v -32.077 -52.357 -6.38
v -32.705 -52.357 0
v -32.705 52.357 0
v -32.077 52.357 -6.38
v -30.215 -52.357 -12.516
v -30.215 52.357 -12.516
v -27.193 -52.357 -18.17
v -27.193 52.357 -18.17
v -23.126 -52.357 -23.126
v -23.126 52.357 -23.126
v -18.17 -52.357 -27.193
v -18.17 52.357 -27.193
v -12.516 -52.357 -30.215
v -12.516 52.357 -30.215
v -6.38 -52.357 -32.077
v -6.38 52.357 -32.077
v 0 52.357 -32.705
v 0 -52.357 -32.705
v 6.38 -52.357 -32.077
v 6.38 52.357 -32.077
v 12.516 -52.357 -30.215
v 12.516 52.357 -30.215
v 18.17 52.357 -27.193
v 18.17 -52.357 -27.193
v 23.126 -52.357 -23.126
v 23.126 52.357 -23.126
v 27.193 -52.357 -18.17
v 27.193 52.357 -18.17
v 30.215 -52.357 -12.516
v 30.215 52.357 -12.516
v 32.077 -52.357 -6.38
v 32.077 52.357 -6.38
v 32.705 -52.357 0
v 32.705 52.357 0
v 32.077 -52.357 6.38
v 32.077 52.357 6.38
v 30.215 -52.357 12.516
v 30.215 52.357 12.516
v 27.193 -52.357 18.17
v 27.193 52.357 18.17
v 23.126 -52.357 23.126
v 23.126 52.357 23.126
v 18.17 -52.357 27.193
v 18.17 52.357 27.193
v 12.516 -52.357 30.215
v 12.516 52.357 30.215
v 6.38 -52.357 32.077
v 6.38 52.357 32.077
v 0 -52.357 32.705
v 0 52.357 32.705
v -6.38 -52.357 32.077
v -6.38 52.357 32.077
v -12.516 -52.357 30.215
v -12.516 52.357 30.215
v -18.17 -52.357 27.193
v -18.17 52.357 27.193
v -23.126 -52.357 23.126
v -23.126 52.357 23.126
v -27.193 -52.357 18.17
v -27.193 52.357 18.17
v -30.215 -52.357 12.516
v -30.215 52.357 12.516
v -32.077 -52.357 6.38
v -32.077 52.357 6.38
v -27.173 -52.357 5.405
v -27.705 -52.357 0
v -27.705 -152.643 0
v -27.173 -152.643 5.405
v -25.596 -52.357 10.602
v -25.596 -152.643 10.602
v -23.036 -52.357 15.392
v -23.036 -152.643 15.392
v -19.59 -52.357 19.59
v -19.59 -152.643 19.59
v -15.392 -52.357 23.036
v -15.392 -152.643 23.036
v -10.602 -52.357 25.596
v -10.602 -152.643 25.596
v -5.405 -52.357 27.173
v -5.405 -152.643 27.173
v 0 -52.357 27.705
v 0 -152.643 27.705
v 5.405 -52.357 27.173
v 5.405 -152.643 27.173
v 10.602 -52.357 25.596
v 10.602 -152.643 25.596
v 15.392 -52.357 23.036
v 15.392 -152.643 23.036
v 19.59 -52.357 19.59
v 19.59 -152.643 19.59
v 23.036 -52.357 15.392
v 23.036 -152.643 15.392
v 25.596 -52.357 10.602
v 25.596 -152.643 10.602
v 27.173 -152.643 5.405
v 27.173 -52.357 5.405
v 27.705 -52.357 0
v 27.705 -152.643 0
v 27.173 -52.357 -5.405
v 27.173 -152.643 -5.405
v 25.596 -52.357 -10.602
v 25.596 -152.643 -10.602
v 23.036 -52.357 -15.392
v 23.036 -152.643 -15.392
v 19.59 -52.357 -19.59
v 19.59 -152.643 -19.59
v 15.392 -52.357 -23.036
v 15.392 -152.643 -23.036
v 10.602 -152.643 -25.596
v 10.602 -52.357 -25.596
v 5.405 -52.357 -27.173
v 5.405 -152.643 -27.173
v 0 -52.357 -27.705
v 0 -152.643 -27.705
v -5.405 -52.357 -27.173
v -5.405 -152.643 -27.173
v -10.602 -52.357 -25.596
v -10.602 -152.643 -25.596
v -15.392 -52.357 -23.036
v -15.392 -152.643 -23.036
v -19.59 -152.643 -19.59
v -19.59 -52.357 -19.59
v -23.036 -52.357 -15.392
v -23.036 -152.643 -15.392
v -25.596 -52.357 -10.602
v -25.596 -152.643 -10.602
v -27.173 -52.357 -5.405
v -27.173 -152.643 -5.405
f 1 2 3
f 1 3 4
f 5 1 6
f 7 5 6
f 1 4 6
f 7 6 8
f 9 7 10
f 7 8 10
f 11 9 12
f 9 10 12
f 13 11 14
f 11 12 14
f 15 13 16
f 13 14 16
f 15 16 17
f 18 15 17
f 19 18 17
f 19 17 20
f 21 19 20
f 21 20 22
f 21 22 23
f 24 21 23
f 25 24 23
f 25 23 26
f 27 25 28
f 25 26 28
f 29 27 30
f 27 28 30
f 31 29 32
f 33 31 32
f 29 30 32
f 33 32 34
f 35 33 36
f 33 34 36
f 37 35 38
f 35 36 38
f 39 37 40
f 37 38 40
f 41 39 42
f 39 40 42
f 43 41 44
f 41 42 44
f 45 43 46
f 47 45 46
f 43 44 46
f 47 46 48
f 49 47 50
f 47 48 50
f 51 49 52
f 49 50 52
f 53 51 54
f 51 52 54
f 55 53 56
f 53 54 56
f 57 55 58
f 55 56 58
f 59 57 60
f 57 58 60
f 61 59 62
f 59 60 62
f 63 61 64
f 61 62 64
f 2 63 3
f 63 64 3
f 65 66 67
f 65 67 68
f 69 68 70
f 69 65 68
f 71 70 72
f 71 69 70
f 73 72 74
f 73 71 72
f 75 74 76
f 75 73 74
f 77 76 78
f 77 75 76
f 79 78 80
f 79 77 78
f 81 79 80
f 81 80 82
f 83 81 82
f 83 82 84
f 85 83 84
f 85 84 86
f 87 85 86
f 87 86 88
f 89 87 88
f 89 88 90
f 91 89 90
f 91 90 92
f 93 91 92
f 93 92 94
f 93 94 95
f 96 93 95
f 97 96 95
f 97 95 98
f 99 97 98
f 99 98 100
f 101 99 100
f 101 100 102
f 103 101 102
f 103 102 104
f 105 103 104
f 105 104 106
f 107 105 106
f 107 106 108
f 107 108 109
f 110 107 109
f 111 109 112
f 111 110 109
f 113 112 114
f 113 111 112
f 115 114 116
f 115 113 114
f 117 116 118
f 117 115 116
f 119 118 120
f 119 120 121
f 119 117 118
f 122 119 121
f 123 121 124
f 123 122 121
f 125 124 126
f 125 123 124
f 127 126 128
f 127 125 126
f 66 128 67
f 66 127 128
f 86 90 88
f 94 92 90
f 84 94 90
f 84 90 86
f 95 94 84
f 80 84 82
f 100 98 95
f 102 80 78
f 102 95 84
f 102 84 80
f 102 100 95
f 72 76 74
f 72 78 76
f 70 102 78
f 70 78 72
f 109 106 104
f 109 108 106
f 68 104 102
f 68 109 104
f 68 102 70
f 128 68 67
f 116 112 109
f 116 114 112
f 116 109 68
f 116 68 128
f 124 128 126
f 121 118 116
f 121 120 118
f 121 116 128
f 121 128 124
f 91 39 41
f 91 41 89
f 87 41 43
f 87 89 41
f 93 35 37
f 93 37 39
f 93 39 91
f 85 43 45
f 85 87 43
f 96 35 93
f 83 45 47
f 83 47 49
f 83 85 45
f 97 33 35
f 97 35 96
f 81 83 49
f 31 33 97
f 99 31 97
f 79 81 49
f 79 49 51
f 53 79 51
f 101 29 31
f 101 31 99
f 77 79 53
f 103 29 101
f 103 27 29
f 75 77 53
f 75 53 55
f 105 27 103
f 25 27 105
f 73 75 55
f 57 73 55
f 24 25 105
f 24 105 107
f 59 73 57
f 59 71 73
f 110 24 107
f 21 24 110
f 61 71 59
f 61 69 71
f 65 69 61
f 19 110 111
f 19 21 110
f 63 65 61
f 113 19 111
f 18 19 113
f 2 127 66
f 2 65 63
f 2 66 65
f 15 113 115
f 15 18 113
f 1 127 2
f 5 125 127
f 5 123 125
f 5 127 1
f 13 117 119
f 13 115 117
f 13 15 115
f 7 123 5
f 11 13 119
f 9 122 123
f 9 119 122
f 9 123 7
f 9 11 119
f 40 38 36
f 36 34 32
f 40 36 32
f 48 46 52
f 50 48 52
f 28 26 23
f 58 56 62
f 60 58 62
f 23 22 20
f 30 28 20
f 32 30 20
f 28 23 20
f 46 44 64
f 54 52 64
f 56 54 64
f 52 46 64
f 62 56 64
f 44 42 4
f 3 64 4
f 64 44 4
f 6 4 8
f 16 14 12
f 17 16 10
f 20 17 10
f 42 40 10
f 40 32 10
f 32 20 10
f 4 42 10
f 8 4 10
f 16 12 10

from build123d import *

# Parameters (mm, degrees)
F0_W     = 32.7049233019
F0_H     = 104.7131195664
F2_T     = -5
F3_DEPTH = 200


with BuildPart() as f1:
    # F0 (on Top) → F1 (revolve)
    with BuildSketch(Plane.XY):
        with Locations((-16.352461651, 0)):
            Rectangle(F0_W, F0_H)
    revolve(axis=Axis((0, 0, 0), (0, -1, 0)))

    # F2
    f2_openings = [f1.faces().sort_by_distance(p)[0] for p in [
        (0, -52.35656, 0),
    ]]
    offset(amount=F2_T, openings=f2_openings)

    # F3 (add): a face of the model
    f3_faces = [f1.faces().sort_by_distance(p)[0] for p in [
        (0, 47.3565597832, 0),
    ]]
    extrude(f3_faces, amount=F3_DEPTH)


solid = f1.part
